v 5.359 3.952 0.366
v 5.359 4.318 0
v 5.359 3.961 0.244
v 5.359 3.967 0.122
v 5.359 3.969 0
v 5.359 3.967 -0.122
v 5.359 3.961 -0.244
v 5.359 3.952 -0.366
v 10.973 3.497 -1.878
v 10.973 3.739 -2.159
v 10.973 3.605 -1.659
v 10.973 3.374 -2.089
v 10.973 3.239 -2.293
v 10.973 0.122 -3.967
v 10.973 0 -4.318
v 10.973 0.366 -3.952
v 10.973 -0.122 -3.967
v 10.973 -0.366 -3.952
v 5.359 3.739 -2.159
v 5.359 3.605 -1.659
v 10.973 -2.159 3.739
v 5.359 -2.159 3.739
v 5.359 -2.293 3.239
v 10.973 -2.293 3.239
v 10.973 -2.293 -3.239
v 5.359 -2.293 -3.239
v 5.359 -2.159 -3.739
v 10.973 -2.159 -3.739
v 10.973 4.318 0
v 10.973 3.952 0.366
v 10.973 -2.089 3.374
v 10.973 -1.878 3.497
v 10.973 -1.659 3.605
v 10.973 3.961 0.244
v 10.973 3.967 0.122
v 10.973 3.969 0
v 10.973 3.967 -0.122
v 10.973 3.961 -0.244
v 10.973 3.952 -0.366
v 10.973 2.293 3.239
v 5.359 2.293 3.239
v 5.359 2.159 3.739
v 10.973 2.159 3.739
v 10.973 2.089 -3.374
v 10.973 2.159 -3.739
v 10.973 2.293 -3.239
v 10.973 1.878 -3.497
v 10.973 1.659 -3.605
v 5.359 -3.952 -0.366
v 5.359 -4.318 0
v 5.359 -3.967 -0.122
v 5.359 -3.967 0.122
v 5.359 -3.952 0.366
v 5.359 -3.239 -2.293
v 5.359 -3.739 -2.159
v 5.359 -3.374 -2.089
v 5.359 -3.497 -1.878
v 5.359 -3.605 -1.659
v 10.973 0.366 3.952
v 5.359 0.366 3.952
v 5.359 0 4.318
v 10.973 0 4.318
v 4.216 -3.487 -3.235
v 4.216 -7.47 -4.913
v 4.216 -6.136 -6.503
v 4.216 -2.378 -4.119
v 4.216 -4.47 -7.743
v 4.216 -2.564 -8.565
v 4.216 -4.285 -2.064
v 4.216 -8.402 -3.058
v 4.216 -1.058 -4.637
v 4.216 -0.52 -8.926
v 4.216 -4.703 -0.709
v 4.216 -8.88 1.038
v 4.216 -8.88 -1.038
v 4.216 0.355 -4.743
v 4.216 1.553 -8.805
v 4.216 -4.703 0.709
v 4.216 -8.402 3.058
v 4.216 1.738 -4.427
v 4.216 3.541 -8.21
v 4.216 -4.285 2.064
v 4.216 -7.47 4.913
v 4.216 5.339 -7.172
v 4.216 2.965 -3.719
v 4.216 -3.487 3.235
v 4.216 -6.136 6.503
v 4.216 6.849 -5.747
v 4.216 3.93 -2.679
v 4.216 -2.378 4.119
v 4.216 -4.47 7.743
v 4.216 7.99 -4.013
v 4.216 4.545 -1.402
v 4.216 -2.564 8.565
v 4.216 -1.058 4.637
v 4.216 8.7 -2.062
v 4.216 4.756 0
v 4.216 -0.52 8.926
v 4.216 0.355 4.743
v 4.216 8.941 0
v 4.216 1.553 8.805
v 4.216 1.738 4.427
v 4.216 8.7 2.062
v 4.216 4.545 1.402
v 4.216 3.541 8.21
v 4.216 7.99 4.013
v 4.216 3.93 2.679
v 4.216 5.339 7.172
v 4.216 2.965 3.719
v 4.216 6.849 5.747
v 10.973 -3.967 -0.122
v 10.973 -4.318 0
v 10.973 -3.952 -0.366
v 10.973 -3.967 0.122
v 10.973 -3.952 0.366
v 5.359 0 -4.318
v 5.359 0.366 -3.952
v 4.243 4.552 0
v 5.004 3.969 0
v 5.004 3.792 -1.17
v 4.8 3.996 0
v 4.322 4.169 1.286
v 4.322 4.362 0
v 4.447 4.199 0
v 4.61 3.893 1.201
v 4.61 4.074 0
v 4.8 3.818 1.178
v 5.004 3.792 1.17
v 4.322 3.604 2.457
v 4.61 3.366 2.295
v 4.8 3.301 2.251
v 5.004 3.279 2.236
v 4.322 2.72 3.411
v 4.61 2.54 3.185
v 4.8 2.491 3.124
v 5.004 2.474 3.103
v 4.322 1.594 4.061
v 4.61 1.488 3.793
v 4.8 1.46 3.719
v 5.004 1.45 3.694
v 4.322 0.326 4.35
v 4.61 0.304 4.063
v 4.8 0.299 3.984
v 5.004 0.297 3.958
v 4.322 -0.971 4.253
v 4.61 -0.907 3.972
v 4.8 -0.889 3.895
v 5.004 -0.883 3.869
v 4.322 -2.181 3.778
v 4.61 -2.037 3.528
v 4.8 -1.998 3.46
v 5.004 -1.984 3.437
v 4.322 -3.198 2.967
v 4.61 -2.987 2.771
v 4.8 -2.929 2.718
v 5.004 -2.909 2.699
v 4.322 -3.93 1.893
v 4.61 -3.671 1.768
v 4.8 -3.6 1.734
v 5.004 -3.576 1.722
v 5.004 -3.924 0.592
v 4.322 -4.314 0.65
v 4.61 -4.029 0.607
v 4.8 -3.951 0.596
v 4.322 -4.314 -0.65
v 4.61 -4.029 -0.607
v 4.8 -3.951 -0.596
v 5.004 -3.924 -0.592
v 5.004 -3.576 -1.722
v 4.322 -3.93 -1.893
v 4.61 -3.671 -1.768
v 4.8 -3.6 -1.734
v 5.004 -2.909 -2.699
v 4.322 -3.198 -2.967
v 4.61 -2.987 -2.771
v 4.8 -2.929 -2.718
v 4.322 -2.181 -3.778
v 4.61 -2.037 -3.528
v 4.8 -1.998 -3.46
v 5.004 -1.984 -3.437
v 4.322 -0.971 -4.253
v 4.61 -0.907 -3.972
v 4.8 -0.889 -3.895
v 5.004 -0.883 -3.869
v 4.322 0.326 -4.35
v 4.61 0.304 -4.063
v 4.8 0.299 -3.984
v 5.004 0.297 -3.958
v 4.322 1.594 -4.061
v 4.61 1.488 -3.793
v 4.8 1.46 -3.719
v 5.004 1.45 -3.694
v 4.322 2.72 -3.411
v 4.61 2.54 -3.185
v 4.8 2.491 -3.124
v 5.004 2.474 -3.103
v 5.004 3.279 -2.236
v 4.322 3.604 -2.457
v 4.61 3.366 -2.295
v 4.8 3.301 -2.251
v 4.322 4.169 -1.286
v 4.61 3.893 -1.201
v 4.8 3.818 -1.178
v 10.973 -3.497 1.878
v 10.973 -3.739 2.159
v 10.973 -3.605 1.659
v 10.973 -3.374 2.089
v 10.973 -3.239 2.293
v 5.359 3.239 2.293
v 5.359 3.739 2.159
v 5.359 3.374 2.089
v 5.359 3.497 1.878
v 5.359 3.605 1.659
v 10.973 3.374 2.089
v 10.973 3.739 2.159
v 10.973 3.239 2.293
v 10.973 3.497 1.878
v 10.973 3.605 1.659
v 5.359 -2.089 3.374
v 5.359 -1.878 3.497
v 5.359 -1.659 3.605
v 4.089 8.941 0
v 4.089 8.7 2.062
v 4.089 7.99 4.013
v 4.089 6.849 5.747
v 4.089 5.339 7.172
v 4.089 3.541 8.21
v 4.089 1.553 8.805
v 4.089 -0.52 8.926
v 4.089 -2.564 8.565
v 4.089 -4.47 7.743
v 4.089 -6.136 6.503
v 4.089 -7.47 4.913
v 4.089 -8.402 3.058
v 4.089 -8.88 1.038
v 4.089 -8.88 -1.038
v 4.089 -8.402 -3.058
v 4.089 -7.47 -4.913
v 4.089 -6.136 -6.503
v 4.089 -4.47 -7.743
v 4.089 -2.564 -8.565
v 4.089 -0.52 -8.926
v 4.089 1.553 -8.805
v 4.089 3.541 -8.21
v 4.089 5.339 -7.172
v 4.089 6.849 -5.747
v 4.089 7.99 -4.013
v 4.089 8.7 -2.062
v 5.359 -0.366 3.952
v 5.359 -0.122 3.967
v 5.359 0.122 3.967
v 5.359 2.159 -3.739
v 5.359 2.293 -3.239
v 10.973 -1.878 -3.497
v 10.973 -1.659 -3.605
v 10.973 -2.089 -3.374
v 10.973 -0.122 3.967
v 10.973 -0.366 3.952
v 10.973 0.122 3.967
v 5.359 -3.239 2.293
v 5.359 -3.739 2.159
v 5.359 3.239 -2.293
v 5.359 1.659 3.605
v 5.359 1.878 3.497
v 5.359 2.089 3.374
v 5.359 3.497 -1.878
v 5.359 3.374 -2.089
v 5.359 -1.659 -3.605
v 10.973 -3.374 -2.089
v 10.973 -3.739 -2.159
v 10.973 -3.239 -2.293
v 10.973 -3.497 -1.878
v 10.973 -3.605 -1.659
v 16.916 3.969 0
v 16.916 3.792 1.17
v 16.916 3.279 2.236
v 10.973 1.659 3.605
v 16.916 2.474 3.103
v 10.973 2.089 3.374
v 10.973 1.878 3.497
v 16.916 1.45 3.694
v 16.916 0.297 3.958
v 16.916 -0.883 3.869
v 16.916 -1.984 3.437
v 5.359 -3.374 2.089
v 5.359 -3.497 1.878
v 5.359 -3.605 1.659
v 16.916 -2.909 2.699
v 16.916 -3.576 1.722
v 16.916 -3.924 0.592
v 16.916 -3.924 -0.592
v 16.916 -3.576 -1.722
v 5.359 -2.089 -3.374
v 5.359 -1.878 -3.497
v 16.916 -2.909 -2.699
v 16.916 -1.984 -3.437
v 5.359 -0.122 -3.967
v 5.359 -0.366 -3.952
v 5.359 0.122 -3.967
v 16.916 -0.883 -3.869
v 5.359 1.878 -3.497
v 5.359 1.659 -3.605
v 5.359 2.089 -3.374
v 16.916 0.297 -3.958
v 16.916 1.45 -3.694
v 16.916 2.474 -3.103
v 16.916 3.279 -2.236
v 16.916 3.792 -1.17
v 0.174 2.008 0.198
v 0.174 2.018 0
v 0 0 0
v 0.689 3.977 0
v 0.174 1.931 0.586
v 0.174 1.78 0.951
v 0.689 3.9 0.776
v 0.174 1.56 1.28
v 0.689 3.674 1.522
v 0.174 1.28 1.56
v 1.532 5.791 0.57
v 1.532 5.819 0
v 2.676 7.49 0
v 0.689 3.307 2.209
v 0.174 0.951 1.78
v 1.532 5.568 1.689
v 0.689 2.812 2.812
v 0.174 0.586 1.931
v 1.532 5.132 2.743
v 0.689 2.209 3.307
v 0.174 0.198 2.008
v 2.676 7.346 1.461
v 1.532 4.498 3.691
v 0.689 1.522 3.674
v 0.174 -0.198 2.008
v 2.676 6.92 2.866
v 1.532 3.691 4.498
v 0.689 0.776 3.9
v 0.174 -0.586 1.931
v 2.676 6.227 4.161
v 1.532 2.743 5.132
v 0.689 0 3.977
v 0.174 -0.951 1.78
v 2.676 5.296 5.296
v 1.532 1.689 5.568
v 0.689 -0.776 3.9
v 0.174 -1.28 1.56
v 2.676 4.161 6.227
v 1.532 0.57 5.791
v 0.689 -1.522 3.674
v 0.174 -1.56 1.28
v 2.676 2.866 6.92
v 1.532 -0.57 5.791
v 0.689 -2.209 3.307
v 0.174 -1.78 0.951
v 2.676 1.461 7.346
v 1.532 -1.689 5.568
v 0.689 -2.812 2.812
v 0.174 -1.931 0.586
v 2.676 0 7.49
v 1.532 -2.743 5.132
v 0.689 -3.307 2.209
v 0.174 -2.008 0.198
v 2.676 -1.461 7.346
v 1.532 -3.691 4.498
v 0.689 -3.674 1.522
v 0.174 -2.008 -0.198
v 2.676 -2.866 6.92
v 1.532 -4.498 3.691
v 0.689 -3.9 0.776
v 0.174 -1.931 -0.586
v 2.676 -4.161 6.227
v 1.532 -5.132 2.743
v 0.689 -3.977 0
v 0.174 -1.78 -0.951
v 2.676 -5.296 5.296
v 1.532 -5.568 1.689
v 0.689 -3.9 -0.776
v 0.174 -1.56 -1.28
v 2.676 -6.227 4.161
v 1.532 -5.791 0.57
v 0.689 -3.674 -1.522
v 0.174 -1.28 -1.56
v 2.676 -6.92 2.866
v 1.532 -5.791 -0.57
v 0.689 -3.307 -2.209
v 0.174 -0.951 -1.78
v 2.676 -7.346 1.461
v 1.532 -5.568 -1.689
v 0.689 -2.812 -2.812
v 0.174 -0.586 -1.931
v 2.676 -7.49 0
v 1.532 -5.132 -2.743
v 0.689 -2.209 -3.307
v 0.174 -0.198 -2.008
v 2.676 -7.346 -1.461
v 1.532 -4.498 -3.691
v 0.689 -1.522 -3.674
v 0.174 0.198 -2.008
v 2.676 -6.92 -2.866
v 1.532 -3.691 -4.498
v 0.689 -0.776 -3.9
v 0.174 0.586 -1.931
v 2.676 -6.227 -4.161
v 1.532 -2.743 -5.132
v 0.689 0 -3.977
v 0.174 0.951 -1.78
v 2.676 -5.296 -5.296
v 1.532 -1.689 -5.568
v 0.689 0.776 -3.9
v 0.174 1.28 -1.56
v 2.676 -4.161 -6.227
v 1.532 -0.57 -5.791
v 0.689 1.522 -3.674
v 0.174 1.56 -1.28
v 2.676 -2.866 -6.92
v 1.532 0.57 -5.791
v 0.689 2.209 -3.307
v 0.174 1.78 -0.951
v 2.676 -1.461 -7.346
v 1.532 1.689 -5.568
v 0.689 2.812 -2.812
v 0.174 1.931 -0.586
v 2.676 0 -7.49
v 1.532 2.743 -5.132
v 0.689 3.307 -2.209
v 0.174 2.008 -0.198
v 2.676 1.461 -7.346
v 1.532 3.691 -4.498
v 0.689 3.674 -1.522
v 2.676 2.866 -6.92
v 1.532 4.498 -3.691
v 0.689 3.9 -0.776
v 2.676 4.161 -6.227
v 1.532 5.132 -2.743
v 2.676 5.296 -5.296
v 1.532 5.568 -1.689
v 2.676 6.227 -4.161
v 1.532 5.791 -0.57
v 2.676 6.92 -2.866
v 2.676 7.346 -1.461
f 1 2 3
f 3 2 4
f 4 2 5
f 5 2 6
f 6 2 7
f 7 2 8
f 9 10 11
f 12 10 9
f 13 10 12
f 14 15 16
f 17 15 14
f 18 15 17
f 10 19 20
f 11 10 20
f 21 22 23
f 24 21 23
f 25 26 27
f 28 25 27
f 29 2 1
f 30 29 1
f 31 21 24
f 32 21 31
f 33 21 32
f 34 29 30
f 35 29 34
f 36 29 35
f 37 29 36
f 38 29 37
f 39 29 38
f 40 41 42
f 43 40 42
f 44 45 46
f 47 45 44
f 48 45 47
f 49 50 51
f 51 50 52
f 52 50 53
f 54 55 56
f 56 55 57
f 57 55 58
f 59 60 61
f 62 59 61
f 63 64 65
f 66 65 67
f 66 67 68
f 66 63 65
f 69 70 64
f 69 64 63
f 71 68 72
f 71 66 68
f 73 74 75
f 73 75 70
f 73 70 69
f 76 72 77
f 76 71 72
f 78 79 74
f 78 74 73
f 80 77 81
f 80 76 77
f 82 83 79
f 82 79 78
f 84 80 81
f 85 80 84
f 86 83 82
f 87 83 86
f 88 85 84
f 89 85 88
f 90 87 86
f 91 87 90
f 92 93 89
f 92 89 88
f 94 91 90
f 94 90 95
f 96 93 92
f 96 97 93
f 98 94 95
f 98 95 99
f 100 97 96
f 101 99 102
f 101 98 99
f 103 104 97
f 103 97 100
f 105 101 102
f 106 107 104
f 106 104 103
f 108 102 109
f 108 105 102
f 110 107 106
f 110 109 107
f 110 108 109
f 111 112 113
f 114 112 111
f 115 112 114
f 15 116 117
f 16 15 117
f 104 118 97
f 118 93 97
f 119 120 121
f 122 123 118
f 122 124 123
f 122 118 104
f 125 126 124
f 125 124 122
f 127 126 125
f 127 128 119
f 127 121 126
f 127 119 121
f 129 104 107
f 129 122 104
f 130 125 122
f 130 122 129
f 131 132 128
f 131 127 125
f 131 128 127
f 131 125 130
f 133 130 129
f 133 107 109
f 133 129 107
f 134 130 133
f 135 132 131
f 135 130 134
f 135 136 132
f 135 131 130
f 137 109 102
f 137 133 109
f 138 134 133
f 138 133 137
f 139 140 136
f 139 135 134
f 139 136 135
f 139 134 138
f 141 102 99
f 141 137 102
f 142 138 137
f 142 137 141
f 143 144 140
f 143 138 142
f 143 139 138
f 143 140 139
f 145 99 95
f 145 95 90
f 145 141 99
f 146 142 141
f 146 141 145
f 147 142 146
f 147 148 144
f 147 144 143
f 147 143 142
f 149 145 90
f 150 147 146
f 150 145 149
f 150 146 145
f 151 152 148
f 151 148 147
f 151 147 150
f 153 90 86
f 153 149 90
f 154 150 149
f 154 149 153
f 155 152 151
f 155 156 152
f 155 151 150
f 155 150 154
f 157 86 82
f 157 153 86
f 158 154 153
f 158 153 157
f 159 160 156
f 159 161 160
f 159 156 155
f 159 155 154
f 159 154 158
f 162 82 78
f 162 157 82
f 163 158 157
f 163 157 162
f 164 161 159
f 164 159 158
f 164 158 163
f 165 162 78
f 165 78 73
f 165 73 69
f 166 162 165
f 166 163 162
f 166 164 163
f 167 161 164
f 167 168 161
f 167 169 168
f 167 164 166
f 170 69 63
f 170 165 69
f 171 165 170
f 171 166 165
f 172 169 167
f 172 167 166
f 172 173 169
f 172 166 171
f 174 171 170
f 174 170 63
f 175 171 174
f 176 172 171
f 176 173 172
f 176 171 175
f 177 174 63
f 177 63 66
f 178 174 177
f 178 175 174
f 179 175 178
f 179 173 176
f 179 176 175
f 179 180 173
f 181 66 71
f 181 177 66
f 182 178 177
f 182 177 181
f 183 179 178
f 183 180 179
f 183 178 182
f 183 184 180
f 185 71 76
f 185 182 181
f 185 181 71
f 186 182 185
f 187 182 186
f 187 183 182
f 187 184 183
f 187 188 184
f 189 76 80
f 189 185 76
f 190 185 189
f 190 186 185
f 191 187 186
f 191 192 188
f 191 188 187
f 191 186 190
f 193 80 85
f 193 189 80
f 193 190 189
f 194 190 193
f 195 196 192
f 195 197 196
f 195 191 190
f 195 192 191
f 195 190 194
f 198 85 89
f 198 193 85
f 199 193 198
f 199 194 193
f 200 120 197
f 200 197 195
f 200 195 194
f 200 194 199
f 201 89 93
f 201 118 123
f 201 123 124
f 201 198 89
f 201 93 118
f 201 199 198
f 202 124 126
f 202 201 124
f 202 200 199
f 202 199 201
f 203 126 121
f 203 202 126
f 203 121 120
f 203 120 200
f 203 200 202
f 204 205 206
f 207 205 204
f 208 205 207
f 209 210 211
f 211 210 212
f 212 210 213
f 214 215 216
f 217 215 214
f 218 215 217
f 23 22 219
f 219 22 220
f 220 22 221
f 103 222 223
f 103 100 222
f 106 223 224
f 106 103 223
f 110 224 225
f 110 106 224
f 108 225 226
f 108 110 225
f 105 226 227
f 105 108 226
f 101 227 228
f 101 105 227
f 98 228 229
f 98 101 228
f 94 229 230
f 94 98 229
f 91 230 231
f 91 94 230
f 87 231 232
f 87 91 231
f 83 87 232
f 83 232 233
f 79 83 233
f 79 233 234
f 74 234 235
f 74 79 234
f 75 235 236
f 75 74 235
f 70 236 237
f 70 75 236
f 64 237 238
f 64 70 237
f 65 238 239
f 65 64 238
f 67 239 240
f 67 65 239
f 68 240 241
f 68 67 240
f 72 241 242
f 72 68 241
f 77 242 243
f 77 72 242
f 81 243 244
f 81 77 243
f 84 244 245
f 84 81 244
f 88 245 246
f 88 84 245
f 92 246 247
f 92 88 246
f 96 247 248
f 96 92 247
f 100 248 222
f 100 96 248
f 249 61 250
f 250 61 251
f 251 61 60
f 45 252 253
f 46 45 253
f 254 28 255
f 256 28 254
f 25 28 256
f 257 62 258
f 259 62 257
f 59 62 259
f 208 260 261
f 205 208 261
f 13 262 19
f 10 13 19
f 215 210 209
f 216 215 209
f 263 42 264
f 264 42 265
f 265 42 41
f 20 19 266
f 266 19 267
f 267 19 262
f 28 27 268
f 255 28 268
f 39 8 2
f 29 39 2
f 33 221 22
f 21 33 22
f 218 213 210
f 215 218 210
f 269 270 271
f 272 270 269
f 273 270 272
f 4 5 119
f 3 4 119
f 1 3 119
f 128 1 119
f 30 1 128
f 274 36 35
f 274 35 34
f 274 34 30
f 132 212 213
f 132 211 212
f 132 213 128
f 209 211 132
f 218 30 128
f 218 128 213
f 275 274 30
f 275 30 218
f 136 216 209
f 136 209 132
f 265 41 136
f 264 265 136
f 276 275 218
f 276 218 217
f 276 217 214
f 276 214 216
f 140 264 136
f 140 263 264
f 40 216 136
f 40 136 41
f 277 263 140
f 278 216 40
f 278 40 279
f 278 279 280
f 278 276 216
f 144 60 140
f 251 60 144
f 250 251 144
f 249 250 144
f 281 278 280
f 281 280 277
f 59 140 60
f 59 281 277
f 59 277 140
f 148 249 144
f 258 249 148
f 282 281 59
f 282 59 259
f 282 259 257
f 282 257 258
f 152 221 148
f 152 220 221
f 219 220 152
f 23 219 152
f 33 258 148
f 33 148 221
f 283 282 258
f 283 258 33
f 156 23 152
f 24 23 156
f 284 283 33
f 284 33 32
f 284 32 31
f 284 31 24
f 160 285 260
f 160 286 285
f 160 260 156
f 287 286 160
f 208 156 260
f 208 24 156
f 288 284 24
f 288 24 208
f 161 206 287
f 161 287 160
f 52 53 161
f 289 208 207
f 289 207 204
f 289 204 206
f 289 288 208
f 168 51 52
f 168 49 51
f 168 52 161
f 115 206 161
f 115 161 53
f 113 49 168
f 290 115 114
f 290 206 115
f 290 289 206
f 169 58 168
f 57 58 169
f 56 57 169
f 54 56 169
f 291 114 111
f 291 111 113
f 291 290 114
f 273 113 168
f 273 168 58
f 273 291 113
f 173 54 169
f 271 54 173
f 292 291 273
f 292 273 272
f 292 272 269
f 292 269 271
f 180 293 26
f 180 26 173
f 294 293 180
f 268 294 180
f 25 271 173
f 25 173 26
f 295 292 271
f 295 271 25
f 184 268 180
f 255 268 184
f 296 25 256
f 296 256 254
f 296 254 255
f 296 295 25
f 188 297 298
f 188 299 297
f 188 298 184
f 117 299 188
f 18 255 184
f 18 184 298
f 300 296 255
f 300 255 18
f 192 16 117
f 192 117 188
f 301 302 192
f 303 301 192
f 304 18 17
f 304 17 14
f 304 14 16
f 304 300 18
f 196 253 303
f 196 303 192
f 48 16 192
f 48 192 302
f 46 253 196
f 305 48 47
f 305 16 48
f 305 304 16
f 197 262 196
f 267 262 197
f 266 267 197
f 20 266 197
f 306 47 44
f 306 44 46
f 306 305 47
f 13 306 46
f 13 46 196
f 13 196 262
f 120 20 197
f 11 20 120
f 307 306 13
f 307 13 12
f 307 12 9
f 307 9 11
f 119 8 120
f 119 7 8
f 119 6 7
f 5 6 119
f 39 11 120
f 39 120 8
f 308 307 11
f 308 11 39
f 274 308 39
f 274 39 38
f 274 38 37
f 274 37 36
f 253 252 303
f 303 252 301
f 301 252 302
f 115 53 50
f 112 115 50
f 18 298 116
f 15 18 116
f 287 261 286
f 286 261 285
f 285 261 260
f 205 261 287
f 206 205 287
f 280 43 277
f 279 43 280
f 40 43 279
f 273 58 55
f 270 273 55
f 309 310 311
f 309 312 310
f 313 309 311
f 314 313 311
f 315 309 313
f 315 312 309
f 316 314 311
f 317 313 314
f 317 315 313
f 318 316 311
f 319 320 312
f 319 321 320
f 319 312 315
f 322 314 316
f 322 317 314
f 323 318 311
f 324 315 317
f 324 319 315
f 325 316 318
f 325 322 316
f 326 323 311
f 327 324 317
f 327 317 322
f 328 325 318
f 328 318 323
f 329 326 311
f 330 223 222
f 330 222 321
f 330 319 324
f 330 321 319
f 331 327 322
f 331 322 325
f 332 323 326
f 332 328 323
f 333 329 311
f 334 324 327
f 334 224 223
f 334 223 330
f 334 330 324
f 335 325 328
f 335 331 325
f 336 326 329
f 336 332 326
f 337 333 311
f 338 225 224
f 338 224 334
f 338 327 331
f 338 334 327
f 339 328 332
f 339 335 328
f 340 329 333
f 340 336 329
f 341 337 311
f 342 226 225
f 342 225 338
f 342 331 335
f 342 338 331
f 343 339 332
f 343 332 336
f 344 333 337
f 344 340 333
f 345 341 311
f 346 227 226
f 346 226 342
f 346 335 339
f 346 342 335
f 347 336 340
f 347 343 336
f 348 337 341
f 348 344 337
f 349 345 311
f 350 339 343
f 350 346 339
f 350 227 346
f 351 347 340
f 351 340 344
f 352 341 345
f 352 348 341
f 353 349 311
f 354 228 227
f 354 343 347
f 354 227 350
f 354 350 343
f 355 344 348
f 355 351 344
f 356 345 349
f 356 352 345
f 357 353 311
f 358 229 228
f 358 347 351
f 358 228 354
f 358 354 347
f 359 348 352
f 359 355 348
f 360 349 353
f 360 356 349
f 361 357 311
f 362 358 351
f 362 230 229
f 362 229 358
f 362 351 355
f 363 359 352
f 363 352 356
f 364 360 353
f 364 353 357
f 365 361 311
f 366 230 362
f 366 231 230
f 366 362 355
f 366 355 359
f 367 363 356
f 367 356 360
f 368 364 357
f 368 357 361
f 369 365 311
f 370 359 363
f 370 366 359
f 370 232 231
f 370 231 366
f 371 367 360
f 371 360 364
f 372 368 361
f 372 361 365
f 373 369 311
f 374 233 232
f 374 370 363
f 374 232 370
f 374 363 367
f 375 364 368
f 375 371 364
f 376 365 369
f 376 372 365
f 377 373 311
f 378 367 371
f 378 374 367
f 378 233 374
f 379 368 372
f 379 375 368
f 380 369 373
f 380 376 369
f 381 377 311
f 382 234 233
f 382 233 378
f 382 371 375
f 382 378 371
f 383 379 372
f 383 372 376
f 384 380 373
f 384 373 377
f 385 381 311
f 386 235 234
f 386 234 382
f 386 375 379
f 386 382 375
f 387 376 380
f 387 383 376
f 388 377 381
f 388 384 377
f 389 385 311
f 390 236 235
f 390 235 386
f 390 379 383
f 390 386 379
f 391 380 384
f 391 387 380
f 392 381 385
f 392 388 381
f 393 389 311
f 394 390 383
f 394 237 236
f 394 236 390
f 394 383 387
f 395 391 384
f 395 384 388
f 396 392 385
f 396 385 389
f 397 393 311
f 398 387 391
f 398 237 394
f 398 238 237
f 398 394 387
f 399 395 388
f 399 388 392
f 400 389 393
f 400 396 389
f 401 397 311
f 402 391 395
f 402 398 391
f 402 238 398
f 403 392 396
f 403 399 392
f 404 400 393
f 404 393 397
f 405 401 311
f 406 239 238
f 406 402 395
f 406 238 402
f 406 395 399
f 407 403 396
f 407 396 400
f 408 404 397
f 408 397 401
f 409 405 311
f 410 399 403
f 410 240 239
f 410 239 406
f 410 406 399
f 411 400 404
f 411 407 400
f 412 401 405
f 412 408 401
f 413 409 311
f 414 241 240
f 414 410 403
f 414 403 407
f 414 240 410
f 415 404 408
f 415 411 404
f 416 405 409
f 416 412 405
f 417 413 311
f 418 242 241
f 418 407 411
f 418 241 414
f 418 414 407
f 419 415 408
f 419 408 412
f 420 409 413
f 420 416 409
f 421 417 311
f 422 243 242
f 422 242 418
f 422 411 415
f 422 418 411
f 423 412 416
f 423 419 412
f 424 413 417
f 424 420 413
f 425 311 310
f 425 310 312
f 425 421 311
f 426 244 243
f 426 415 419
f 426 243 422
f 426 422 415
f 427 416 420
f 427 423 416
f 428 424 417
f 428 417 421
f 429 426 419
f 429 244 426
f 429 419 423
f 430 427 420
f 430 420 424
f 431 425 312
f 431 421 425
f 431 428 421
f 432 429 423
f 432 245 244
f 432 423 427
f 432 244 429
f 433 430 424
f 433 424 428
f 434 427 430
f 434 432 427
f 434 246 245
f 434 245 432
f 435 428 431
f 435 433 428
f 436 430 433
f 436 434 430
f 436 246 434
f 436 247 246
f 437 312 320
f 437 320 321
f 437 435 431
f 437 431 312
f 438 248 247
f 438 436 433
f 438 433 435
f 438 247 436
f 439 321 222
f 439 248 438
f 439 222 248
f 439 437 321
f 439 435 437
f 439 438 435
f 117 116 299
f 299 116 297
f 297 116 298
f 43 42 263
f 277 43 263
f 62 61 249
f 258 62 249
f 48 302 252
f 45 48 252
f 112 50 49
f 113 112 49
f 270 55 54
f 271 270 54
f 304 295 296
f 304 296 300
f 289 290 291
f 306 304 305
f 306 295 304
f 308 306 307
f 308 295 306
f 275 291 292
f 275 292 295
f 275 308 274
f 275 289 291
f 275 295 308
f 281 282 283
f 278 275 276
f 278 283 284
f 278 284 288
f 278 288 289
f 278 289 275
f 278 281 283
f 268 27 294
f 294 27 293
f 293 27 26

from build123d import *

# Parameters (mm, degrees)
BOSS_EXTRUDE1_DEPTH = 5.6134
CIRPATTERN1_COUNT   = 12


# Read off the part's stored shape, not the designer's step: ThreadSchematic
with BuildPart() as part:
    # ThreadSchematic outline → ThreadSchematic (revolve)
    with BuildSketch(Plane.YX):
        with BuildLine():
            Line((0, 16.9164), (0, 0))
            ThreePointArc((0, 0), (4.915818779, 1.070865158), (8.940800003, 4.089400003))
            Line((8.940800003, 4.089400003), (8.9408, 4.2164))
            Line((8.9408, 4.2164), (4.75615, 4.2164))
            ThreePointArc((4.75615, 4.2164), (4.19937412, 4.44702412), (3.96875, 5.0038))
            Line((3.96875, 5.0038), (3.96875, 16.9164))
            Line((3.96875, 16.9164), (0, 16.9164))
        make_face()
    revolve(axis=Axis((0, 0, 0), (1, 0, 0)))

    # Sketch2 → Boss-Extrude1 (add)
    with BuildSketch(Plane(origin=(5.3594, 0, 0), x_dir=(0, 0, -1), z_dir=(1, 0, 0))):
        Polygon((-4.318, 0), (-3.95182104, -0.36617896), (0, 0), (-3.95182104, 0.36617896), align=None)
    boss_extrude1 = extrude(amount=BOSS_EXTRUDE1_DEPTH)

    # CirPattern1: Boss-Extrude1 ×12 about axis
    cirpattern1_axis = Axis((0, 0, 0), (1, 0, 0))
    for i in range(1, CIRPATTERN1_COUNT):
        add(boss_extrude1.rotate(cirpattern1_axis, i * 360 / CIRPATTERN1_COUNT))


solid = part.part
